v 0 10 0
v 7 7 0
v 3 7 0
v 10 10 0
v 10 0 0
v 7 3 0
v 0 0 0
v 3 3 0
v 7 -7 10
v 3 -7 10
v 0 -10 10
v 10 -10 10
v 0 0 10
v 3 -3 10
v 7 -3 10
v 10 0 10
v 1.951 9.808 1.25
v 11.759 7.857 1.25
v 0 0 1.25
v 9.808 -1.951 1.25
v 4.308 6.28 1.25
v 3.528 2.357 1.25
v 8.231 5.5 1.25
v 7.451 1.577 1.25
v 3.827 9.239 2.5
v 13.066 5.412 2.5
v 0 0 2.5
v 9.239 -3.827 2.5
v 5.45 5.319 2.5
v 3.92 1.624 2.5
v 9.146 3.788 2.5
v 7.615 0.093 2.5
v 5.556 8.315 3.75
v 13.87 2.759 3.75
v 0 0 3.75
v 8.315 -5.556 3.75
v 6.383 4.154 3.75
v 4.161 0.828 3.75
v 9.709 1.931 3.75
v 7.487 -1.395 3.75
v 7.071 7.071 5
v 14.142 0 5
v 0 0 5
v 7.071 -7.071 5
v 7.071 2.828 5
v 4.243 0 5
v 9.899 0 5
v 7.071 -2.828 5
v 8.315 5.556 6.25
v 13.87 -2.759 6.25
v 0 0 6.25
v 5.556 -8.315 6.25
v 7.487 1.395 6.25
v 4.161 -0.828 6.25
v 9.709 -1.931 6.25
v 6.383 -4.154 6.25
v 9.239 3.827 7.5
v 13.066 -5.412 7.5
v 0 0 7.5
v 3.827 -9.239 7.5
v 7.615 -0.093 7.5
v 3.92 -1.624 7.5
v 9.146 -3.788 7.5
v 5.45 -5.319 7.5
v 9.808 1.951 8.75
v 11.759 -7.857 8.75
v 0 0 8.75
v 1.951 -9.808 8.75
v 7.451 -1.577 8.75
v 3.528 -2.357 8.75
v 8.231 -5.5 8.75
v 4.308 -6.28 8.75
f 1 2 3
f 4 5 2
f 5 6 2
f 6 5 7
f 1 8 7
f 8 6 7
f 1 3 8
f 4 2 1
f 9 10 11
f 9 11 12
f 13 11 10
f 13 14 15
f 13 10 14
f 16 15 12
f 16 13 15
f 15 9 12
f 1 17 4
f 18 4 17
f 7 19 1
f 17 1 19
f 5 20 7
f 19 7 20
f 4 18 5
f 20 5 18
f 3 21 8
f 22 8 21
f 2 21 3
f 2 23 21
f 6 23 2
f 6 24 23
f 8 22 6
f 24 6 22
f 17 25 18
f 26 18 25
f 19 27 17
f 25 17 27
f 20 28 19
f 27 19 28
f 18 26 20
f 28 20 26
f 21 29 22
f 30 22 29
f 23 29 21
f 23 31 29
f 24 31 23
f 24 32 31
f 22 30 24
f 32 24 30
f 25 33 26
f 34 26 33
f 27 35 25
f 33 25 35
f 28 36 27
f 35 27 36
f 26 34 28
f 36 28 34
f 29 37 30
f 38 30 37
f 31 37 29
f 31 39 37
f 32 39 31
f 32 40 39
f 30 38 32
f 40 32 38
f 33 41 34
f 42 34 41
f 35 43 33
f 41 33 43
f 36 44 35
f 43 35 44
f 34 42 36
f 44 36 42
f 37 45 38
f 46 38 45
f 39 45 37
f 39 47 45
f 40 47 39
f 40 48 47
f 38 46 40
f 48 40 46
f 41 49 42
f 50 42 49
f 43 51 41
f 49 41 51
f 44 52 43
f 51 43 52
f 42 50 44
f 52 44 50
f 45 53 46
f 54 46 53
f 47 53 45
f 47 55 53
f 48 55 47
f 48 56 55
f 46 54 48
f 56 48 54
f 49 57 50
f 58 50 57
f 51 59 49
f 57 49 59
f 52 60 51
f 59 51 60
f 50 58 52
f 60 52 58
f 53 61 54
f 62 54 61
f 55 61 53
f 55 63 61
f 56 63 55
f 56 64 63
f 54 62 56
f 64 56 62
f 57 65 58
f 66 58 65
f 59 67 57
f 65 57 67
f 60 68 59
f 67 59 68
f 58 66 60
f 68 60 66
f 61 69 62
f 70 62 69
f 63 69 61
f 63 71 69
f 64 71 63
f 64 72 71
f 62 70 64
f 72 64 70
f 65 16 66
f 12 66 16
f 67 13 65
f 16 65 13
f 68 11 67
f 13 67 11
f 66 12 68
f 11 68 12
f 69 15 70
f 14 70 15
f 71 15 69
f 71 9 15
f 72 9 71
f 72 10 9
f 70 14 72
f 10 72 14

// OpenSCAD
// A twisted profile with a hole. The hole's wall quads lean the opposite way to
// the outer's, because its indices run the other way round — and each quad is
// split along its shorter diagonal, so getting this wrong is a 0.6% volume error
// with an otherwise identical mesh.
//
// oracle: tris
linear_extrude(height=10, twist=90) difference() { square(10); translate([3,3]) square(4); }
